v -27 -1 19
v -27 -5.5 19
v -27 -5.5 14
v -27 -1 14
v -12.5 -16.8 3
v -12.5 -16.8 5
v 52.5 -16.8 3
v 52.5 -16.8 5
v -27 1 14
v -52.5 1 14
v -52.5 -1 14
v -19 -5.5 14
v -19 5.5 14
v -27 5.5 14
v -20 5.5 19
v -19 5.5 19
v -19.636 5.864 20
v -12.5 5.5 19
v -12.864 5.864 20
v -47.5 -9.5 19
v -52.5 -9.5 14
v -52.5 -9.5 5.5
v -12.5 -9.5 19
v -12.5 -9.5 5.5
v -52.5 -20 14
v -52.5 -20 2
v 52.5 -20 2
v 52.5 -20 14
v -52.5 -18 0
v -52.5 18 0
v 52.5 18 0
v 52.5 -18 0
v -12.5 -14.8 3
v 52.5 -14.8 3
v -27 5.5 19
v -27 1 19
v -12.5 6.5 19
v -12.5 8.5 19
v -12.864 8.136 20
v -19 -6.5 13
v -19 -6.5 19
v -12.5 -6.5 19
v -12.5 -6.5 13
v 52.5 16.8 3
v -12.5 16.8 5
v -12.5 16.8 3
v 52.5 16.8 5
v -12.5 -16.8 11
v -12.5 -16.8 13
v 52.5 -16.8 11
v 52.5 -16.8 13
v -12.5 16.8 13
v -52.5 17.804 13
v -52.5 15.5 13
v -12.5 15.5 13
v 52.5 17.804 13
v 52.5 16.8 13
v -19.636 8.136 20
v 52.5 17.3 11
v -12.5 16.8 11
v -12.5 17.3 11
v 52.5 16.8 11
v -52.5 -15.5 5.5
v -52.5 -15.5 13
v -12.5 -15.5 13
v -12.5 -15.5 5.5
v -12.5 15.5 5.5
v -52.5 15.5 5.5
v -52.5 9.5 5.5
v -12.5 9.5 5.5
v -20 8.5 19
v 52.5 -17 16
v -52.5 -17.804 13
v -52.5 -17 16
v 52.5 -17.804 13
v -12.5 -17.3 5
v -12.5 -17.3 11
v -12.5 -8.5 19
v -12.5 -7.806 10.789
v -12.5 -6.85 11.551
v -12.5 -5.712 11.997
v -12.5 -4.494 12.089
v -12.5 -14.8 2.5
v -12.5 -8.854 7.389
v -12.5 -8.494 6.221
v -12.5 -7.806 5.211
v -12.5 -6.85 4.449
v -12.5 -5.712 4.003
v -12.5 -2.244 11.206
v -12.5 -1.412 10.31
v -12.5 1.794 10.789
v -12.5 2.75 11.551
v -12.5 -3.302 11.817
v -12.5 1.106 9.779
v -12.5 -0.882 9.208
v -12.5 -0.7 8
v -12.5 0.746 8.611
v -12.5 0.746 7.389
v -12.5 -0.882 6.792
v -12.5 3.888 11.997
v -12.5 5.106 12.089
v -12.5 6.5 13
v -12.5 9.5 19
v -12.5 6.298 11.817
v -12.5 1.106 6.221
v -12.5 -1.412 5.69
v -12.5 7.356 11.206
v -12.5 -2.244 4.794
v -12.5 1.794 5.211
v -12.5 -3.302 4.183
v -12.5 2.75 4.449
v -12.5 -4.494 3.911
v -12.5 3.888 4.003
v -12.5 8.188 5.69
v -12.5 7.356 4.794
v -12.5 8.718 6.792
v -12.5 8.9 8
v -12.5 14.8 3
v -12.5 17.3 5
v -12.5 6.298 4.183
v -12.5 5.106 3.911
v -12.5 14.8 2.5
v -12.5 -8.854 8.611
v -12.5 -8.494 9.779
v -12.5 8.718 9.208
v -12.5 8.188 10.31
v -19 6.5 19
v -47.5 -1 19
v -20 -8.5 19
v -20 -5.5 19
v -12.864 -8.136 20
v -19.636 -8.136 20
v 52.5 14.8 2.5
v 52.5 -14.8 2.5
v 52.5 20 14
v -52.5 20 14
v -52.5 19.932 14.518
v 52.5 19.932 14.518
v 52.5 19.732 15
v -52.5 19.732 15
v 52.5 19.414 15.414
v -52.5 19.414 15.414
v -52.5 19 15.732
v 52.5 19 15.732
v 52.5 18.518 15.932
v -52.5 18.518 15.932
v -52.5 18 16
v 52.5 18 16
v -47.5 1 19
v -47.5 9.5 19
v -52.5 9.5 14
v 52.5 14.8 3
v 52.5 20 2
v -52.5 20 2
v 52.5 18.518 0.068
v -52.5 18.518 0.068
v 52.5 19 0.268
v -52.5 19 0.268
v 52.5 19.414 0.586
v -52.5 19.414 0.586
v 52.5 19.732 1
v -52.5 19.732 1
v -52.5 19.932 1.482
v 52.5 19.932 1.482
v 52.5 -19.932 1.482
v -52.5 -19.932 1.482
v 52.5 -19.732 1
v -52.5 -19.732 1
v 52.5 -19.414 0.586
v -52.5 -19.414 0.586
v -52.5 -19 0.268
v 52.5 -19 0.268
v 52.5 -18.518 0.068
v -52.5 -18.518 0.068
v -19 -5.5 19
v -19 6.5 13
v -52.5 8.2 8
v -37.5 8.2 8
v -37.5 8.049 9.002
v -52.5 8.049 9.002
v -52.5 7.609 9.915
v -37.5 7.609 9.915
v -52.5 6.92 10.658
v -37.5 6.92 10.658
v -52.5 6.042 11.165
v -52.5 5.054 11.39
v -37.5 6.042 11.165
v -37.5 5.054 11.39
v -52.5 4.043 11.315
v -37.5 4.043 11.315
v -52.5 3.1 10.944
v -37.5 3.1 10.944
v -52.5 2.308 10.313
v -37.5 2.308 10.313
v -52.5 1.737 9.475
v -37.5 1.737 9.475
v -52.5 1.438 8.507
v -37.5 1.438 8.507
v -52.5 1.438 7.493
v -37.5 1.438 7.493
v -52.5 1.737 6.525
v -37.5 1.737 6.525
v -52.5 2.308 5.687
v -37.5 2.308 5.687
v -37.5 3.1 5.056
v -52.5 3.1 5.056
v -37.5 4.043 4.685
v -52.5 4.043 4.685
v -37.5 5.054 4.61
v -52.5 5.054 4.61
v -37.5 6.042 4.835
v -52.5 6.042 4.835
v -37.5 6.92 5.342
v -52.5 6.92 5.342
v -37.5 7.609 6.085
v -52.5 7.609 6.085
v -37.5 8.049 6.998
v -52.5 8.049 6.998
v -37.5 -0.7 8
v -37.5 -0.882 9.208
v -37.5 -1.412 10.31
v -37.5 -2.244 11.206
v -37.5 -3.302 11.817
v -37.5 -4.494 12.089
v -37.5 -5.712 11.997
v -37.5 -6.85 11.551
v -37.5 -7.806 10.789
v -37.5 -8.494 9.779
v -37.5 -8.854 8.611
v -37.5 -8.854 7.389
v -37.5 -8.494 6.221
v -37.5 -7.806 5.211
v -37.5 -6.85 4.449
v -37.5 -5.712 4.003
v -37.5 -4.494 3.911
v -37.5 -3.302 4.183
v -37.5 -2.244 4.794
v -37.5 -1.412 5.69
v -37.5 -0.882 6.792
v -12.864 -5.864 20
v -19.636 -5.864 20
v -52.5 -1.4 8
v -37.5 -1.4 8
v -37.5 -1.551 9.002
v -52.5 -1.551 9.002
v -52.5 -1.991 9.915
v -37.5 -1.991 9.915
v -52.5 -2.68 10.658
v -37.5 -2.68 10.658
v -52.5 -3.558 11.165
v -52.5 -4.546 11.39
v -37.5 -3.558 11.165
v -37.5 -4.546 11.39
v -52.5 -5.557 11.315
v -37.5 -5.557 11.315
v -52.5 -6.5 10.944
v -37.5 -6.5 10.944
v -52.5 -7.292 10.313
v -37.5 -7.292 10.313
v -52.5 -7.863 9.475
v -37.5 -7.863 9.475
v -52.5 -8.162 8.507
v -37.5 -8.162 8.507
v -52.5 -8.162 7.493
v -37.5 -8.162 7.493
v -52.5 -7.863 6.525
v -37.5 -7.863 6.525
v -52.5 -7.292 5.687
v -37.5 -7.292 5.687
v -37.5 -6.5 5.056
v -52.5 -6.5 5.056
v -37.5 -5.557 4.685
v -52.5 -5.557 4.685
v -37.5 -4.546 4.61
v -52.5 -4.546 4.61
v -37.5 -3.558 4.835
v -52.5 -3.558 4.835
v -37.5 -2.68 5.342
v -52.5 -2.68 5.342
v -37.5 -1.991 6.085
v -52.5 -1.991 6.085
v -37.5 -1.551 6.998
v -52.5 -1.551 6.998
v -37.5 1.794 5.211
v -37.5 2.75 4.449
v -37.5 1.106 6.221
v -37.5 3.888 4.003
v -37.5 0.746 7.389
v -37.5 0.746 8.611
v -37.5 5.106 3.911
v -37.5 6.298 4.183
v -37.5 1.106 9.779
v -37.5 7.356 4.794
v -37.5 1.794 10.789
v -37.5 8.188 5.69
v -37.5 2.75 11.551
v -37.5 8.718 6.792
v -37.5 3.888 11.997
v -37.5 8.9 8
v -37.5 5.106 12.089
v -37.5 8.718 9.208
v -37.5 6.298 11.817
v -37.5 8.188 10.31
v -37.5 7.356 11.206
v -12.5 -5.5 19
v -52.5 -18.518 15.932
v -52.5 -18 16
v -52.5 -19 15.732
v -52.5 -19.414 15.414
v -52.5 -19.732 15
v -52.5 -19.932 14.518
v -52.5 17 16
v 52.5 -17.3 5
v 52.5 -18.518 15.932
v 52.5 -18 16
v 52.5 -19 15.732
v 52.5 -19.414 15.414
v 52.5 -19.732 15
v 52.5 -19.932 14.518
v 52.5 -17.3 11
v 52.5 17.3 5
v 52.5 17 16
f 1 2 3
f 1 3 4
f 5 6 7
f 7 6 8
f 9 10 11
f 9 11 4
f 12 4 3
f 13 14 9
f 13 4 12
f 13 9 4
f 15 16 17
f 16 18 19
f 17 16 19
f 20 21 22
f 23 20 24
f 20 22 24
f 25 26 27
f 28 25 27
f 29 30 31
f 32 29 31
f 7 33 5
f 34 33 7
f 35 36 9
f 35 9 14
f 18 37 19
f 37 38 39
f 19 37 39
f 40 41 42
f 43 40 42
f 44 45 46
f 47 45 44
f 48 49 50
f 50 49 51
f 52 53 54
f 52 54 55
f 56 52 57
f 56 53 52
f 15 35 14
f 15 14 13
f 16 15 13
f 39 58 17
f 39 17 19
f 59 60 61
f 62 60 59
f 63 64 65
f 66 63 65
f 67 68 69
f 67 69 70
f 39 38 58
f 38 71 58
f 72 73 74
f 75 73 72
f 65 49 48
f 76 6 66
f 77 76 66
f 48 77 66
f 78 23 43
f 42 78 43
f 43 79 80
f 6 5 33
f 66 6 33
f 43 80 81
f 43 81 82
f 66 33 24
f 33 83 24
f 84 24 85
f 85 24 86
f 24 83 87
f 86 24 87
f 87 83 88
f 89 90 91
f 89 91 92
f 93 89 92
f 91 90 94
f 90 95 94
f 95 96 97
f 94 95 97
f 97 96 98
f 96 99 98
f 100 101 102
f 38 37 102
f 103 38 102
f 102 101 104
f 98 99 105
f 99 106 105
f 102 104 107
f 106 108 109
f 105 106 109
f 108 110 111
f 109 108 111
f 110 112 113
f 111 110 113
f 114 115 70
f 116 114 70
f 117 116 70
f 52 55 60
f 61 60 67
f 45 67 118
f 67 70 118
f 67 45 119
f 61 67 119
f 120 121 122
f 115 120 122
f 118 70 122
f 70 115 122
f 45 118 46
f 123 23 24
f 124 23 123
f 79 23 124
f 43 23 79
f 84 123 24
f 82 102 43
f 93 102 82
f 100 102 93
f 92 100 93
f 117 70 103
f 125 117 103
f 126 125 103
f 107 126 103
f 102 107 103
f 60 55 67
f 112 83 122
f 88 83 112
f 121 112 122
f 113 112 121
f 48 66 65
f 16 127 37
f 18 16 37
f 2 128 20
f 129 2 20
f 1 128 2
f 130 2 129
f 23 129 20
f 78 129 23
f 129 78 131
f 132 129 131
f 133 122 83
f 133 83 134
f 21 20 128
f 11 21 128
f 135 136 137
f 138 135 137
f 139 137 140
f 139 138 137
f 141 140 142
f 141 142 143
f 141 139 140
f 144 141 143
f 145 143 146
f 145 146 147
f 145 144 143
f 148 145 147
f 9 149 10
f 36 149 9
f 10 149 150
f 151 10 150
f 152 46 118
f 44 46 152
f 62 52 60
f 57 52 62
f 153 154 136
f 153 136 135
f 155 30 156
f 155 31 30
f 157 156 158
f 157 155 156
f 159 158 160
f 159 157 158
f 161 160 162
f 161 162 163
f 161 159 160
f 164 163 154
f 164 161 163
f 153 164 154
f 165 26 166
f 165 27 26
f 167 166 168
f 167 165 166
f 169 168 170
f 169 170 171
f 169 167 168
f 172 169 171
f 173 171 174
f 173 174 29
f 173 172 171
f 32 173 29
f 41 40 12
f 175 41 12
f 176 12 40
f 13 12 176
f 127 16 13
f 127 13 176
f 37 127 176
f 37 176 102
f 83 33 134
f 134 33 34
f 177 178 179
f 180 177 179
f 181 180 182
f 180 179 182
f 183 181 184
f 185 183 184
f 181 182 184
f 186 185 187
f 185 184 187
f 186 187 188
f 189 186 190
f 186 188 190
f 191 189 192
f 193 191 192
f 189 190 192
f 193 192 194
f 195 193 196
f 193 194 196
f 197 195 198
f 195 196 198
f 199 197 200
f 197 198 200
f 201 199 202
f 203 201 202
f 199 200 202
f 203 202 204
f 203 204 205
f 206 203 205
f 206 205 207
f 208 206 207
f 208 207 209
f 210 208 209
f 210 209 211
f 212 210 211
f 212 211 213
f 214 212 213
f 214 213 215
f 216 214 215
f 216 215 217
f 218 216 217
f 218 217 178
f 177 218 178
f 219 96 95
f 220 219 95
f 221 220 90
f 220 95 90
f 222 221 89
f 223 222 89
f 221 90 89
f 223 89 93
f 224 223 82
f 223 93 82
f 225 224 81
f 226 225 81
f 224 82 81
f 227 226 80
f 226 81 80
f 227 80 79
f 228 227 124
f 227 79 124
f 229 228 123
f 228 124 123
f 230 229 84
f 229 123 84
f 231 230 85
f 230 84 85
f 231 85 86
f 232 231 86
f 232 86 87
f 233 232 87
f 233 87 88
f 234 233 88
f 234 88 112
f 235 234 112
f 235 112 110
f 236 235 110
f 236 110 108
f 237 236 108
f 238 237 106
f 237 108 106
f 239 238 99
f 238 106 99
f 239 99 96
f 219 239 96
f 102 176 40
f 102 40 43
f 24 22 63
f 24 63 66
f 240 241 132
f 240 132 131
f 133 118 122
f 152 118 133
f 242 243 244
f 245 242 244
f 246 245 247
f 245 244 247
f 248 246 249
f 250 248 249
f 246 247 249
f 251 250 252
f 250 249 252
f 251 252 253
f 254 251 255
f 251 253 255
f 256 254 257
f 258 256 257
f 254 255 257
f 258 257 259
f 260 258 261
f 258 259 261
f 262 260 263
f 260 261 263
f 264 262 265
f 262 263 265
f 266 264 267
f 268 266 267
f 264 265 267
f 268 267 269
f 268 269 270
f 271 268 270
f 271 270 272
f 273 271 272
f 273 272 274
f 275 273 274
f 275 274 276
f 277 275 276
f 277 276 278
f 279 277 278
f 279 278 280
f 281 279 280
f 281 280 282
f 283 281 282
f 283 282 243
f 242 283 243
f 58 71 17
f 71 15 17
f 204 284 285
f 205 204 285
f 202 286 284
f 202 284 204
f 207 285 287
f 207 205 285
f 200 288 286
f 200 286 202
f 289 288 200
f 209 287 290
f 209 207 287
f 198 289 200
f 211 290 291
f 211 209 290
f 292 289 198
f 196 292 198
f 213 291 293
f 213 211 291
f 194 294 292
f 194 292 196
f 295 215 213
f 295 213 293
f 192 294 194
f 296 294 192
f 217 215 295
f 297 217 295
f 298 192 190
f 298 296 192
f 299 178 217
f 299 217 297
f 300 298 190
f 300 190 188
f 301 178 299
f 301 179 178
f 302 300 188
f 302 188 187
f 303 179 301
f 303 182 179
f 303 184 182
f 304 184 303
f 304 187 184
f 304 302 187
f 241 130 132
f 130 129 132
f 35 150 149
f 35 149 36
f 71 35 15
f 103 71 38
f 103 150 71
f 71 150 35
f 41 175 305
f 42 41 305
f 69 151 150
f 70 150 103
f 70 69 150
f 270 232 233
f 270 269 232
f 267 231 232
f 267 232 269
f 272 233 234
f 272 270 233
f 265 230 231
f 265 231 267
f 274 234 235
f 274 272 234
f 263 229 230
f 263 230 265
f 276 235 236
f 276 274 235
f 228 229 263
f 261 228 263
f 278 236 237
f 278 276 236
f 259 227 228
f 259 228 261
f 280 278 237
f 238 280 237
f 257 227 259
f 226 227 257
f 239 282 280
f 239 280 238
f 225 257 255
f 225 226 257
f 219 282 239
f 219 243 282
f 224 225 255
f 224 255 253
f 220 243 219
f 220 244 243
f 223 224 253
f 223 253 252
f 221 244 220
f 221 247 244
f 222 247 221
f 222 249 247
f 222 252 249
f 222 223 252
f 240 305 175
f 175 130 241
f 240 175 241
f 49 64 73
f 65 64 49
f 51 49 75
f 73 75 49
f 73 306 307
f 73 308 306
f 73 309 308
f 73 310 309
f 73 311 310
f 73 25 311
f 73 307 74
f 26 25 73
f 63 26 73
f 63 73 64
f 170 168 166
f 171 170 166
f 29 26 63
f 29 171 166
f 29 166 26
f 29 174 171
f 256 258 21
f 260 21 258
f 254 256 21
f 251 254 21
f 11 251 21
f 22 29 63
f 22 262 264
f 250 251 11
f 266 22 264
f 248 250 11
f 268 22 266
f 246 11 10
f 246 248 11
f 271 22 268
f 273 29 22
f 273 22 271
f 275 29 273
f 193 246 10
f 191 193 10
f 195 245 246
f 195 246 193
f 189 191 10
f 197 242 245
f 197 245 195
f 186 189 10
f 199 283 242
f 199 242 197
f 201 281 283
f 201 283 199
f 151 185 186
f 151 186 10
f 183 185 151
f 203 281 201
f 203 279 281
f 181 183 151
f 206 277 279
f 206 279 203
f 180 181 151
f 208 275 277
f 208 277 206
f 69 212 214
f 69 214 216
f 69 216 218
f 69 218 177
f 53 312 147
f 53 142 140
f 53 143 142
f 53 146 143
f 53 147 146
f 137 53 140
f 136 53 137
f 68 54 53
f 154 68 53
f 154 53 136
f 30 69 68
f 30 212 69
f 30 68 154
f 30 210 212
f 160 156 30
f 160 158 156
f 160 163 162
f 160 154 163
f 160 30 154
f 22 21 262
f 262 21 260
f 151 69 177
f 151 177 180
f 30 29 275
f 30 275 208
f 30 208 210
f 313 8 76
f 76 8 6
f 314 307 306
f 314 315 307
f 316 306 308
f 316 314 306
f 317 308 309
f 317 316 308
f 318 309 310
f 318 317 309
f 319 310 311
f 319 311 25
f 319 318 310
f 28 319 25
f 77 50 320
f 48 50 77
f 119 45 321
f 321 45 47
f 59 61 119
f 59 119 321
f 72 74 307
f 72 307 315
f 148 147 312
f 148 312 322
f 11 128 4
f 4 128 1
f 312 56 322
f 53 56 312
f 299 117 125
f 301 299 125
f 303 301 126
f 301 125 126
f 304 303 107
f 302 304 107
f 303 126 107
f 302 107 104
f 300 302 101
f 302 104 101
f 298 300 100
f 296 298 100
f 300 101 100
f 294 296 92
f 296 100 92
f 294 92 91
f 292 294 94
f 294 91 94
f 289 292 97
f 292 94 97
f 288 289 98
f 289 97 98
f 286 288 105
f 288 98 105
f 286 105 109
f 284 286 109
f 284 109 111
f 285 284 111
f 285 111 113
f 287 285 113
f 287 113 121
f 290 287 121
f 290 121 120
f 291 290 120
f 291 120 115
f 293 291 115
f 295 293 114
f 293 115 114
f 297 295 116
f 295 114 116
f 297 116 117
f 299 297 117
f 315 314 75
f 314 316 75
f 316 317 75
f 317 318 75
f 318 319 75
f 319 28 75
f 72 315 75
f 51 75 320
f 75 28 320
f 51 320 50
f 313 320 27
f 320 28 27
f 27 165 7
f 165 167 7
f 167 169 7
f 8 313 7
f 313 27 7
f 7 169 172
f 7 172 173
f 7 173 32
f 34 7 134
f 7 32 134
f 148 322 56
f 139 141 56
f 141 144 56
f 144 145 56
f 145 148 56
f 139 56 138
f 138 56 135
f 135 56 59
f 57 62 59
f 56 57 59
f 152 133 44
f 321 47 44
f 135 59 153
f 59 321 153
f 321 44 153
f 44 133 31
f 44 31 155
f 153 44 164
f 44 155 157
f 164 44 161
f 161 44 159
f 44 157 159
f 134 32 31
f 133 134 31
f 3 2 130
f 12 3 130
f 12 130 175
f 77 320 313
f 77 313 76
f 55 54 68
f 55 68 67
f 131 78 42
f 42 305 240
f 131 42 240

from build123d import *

# Parameters (mm, degrees)
SKETCH_W        = 105
SKETCH_H        = 40
PAD_DEPTH       = 16
SKETCH001_W     = 65
SKETCH001_H     = 33.6
POCKET_DEPTH    = 13
SKETCH002_R     = 3.4
POCKET001_DEPTH = 40.001
SKETCH014_R     = 4.1
POCKET002_DEPTH = 25
SKETCH006_W     = 40
SKETCH006_H     = 6
POCKET003_DEPTH = 10.5
SKETCH011_W     = 105
SKETCH011_H     = 34
POCKET004_DEPTH = 3
POCKET004_TAPER = -15
SKETCH008_W     = 65
SKETCH008_H     = 29.6
POCKET005_DEPTH = 0.5
SKETCH010_W     = 65
SKETCH010_H     = 6
POCKET006_DEPTH = 0.5
SKETCH015_W     = 65
SKETCH015_H     = 6
POCKET007_DEPTH = 0.5
SKETCH016_W     = 40
SKETCH016_H     = 19
PAD001_DEPTH    = 6
SKETCH017_W     = 6.5
SKETCH017_H     = 13
POCKET008_DEPTH = 6
SKETCH018_W     = 8
SKETCH018_H     = 11
POCKET009_DEPTH = 5
SKETCH019_W     = 25.5
SKETCH019_H     = 2
POCKET010_DEPTH = 5
SKETCH020_W     = 7.5
SKETCH020_H     = 3
PAD002_DEPTH    = 1
PAD002_TAPER    = 20
FILLET_R        = 2
CHAMFER_SIZE    = 5


with BuildPart() as part:
    # Sketch → Pad (new body)
    with BuildSketch(Plane.XY):
        Rectangle(SKETCH_W, SKETCH_H)
    extrude(amount=PAD_DEPTH)

    # Sketch001 (on Face6 of Pad) → Pocket (cut)
    with BuildSketch(Plane.XY.offset(16)):
        with Locations((20, 0)):
            Rectangle(SKETCH001_W, SKETCH001_H)
    extrude(amount=-POCKET_DEPTH, mode=Mode.SUBTRACT)

    # Sketch002 (on Face10 of Pocket) → Pocket001 (cut, through all)
    with BuildSketch(Plane.YZ.offset(-12.5)):
        with Locations((4.8, 8)):
            Circle(SKETCH002_R)
        with Locations((-4.8, 8)):
            Circle(SKETCH002_R)
    extrude(amount=-POCKET001_DEPTH, mode=Mode.SUBTRACT)

    # Sketch014 (on Face12 of Pocket001) → Pocket002 (cut)
    with BuildSketch(Plane.YZ.offset(-12.5)):
        with Locations((4.8, 8)):
            Circle(SKETCH014_R)
        with Locations((-4.8, 8)):
            Circle(SKETCH014_R)
    extrude(amount=-POCKET002_DEPTH, mode=Mode.SUBTRACT)

    # Sketch006 → Pocket003 (cut)
    with BuildSketch(Plane.XY.offset(16)):
        with Locations((-32.5, 12.5)):
            Rectangle(SKETCH006_W, SKETCH006_H)
        with Locations((-32.5, -12.5)):
            Rectangle(SKETCH006_W, SKETCH006_H)
    extrude(amount=-POCKET003_DEPTH, mode=Mode.SUBTRACT)

    # Sketch011 → Pocket004 (cut)
    with BuildSketch(Plane.XY.offset(16)):
        Rectangle(SKETCH011_W, SKETCH011_H)
    extrude(amount=-POCKET004_DEPTH, taper=POCKET004_TAPER, mode=Mode.SUBTRACT)

    # Sketch008 → Pocket005 (cut)
    with BuildSketch(Plane.XY.offset(3)):
        with Locations((20, 0)):
            Rectangle(SKETCH008_W, SKETCH008_H)
    extrude(amount=-POCKET005_DEPTH, mode=Mode.SUBTRACT)

    # Sketch010 → Pocket006 (cut)
    with BuildSketch(Plane(origin=(0, -16.8, 0), x_dir=(-1, 0, 0), z_dir=(0, 1, 0))):
        with Locations((-20, 8)):
            Rectangle(SKETCH010_W, SKETCH010_H)
    extrude(amount=-POCKET006_DEPTH, mode=Mode.SUBTRACT)

    # Sketch015 (on Face31 of Pocket006) → Pocket007 (cut)
    with BuildSketch(Plane.XZ.offset(-16.8)):
        with Locations((20, 8)):
            Rectangle(SKETCH015_W, SKETCH015_H)
    extrude(amount=-POCKET007_DEPTH, mode=Mode.SUBTRACT)

    # Sketch016 (on Face11 of Pocket007) → Pad001 (join)
    with BuildSketch(Plane.XY.offset(13)):
        with Locations((-32.5, 0)):
            Rectangle(SKETCH016_W, SKETCH016_H)
    extrude(amount=PAD001_DEPTH)

    # Sketch017 (on Face39 of Pad001) → Pocket008 (cut)
    with BuildSketch(Plane.XY.offset(19)):
        with Locations((-15.75, 0)):
            Rectangle(SKETCH017_W, SKETCH017_H)
    extrude(amount=-POCKET008_DEPTH, mode=Mode.SUBTRACT)

    # Sketch018 (on Face39 of Pocket008) → Pocket009 (cut)
    with BuildSketch(Plane.XY.offset(19)):
        with Locations((-23, 0)):
            Rectangle(SKETCH018_W, SKETCH018_H)
    extrude(amount=-POCKET009_DEPTH, mode=Mode.SUBTRACT)

    # Sketch019 (on Face39 of Pocket009) → Pocket010 (cut)
    with BuildSketch(Plane.XY.offset(19)):
        with Locations((-39.75, 0)):
            Rectangle(SKETCH019_W, SKETCH019_H)
    extrude(amount=-POCKET010_DEPTH, mode=Mode.SUBTRACT)

    # Sketch020 (on Face42 of Pocket010) → Pad002 (join)
    with BuildSketch(Plane.XY.offset(19)):
        with Locations((-16.25, 7)):
            Rectangle(SKETCH020_W, SKETCH020_H)
        with Locations((-16.25, -7)):
            Rectangle(SKETCH020_W, SKETCH020_H)
    extrude(amount=PAD002_DEPTH, taper=PAD002_TAPER)

    # Fillet
    fillet_edges = [part.edges().sort_by_distance(p)[0] for p in [
        (0, -20, 16),
        (0, -20, 0),
        (0, 20, 16),
        (0, 20, 0),
    ]]
    fillet(fillet_edges, radius=FILLET_R)

    # Chamfer
    chamfer_edges = [part.edges().sort_by_distance(p)[0] for p in [
        (-52.5, -5.25, 19),
        (-52.5, 5.25, 19),
    ]]
    chamfer(chamfer_edges, length=CHAMFER_SIZE)


solid = part.part
